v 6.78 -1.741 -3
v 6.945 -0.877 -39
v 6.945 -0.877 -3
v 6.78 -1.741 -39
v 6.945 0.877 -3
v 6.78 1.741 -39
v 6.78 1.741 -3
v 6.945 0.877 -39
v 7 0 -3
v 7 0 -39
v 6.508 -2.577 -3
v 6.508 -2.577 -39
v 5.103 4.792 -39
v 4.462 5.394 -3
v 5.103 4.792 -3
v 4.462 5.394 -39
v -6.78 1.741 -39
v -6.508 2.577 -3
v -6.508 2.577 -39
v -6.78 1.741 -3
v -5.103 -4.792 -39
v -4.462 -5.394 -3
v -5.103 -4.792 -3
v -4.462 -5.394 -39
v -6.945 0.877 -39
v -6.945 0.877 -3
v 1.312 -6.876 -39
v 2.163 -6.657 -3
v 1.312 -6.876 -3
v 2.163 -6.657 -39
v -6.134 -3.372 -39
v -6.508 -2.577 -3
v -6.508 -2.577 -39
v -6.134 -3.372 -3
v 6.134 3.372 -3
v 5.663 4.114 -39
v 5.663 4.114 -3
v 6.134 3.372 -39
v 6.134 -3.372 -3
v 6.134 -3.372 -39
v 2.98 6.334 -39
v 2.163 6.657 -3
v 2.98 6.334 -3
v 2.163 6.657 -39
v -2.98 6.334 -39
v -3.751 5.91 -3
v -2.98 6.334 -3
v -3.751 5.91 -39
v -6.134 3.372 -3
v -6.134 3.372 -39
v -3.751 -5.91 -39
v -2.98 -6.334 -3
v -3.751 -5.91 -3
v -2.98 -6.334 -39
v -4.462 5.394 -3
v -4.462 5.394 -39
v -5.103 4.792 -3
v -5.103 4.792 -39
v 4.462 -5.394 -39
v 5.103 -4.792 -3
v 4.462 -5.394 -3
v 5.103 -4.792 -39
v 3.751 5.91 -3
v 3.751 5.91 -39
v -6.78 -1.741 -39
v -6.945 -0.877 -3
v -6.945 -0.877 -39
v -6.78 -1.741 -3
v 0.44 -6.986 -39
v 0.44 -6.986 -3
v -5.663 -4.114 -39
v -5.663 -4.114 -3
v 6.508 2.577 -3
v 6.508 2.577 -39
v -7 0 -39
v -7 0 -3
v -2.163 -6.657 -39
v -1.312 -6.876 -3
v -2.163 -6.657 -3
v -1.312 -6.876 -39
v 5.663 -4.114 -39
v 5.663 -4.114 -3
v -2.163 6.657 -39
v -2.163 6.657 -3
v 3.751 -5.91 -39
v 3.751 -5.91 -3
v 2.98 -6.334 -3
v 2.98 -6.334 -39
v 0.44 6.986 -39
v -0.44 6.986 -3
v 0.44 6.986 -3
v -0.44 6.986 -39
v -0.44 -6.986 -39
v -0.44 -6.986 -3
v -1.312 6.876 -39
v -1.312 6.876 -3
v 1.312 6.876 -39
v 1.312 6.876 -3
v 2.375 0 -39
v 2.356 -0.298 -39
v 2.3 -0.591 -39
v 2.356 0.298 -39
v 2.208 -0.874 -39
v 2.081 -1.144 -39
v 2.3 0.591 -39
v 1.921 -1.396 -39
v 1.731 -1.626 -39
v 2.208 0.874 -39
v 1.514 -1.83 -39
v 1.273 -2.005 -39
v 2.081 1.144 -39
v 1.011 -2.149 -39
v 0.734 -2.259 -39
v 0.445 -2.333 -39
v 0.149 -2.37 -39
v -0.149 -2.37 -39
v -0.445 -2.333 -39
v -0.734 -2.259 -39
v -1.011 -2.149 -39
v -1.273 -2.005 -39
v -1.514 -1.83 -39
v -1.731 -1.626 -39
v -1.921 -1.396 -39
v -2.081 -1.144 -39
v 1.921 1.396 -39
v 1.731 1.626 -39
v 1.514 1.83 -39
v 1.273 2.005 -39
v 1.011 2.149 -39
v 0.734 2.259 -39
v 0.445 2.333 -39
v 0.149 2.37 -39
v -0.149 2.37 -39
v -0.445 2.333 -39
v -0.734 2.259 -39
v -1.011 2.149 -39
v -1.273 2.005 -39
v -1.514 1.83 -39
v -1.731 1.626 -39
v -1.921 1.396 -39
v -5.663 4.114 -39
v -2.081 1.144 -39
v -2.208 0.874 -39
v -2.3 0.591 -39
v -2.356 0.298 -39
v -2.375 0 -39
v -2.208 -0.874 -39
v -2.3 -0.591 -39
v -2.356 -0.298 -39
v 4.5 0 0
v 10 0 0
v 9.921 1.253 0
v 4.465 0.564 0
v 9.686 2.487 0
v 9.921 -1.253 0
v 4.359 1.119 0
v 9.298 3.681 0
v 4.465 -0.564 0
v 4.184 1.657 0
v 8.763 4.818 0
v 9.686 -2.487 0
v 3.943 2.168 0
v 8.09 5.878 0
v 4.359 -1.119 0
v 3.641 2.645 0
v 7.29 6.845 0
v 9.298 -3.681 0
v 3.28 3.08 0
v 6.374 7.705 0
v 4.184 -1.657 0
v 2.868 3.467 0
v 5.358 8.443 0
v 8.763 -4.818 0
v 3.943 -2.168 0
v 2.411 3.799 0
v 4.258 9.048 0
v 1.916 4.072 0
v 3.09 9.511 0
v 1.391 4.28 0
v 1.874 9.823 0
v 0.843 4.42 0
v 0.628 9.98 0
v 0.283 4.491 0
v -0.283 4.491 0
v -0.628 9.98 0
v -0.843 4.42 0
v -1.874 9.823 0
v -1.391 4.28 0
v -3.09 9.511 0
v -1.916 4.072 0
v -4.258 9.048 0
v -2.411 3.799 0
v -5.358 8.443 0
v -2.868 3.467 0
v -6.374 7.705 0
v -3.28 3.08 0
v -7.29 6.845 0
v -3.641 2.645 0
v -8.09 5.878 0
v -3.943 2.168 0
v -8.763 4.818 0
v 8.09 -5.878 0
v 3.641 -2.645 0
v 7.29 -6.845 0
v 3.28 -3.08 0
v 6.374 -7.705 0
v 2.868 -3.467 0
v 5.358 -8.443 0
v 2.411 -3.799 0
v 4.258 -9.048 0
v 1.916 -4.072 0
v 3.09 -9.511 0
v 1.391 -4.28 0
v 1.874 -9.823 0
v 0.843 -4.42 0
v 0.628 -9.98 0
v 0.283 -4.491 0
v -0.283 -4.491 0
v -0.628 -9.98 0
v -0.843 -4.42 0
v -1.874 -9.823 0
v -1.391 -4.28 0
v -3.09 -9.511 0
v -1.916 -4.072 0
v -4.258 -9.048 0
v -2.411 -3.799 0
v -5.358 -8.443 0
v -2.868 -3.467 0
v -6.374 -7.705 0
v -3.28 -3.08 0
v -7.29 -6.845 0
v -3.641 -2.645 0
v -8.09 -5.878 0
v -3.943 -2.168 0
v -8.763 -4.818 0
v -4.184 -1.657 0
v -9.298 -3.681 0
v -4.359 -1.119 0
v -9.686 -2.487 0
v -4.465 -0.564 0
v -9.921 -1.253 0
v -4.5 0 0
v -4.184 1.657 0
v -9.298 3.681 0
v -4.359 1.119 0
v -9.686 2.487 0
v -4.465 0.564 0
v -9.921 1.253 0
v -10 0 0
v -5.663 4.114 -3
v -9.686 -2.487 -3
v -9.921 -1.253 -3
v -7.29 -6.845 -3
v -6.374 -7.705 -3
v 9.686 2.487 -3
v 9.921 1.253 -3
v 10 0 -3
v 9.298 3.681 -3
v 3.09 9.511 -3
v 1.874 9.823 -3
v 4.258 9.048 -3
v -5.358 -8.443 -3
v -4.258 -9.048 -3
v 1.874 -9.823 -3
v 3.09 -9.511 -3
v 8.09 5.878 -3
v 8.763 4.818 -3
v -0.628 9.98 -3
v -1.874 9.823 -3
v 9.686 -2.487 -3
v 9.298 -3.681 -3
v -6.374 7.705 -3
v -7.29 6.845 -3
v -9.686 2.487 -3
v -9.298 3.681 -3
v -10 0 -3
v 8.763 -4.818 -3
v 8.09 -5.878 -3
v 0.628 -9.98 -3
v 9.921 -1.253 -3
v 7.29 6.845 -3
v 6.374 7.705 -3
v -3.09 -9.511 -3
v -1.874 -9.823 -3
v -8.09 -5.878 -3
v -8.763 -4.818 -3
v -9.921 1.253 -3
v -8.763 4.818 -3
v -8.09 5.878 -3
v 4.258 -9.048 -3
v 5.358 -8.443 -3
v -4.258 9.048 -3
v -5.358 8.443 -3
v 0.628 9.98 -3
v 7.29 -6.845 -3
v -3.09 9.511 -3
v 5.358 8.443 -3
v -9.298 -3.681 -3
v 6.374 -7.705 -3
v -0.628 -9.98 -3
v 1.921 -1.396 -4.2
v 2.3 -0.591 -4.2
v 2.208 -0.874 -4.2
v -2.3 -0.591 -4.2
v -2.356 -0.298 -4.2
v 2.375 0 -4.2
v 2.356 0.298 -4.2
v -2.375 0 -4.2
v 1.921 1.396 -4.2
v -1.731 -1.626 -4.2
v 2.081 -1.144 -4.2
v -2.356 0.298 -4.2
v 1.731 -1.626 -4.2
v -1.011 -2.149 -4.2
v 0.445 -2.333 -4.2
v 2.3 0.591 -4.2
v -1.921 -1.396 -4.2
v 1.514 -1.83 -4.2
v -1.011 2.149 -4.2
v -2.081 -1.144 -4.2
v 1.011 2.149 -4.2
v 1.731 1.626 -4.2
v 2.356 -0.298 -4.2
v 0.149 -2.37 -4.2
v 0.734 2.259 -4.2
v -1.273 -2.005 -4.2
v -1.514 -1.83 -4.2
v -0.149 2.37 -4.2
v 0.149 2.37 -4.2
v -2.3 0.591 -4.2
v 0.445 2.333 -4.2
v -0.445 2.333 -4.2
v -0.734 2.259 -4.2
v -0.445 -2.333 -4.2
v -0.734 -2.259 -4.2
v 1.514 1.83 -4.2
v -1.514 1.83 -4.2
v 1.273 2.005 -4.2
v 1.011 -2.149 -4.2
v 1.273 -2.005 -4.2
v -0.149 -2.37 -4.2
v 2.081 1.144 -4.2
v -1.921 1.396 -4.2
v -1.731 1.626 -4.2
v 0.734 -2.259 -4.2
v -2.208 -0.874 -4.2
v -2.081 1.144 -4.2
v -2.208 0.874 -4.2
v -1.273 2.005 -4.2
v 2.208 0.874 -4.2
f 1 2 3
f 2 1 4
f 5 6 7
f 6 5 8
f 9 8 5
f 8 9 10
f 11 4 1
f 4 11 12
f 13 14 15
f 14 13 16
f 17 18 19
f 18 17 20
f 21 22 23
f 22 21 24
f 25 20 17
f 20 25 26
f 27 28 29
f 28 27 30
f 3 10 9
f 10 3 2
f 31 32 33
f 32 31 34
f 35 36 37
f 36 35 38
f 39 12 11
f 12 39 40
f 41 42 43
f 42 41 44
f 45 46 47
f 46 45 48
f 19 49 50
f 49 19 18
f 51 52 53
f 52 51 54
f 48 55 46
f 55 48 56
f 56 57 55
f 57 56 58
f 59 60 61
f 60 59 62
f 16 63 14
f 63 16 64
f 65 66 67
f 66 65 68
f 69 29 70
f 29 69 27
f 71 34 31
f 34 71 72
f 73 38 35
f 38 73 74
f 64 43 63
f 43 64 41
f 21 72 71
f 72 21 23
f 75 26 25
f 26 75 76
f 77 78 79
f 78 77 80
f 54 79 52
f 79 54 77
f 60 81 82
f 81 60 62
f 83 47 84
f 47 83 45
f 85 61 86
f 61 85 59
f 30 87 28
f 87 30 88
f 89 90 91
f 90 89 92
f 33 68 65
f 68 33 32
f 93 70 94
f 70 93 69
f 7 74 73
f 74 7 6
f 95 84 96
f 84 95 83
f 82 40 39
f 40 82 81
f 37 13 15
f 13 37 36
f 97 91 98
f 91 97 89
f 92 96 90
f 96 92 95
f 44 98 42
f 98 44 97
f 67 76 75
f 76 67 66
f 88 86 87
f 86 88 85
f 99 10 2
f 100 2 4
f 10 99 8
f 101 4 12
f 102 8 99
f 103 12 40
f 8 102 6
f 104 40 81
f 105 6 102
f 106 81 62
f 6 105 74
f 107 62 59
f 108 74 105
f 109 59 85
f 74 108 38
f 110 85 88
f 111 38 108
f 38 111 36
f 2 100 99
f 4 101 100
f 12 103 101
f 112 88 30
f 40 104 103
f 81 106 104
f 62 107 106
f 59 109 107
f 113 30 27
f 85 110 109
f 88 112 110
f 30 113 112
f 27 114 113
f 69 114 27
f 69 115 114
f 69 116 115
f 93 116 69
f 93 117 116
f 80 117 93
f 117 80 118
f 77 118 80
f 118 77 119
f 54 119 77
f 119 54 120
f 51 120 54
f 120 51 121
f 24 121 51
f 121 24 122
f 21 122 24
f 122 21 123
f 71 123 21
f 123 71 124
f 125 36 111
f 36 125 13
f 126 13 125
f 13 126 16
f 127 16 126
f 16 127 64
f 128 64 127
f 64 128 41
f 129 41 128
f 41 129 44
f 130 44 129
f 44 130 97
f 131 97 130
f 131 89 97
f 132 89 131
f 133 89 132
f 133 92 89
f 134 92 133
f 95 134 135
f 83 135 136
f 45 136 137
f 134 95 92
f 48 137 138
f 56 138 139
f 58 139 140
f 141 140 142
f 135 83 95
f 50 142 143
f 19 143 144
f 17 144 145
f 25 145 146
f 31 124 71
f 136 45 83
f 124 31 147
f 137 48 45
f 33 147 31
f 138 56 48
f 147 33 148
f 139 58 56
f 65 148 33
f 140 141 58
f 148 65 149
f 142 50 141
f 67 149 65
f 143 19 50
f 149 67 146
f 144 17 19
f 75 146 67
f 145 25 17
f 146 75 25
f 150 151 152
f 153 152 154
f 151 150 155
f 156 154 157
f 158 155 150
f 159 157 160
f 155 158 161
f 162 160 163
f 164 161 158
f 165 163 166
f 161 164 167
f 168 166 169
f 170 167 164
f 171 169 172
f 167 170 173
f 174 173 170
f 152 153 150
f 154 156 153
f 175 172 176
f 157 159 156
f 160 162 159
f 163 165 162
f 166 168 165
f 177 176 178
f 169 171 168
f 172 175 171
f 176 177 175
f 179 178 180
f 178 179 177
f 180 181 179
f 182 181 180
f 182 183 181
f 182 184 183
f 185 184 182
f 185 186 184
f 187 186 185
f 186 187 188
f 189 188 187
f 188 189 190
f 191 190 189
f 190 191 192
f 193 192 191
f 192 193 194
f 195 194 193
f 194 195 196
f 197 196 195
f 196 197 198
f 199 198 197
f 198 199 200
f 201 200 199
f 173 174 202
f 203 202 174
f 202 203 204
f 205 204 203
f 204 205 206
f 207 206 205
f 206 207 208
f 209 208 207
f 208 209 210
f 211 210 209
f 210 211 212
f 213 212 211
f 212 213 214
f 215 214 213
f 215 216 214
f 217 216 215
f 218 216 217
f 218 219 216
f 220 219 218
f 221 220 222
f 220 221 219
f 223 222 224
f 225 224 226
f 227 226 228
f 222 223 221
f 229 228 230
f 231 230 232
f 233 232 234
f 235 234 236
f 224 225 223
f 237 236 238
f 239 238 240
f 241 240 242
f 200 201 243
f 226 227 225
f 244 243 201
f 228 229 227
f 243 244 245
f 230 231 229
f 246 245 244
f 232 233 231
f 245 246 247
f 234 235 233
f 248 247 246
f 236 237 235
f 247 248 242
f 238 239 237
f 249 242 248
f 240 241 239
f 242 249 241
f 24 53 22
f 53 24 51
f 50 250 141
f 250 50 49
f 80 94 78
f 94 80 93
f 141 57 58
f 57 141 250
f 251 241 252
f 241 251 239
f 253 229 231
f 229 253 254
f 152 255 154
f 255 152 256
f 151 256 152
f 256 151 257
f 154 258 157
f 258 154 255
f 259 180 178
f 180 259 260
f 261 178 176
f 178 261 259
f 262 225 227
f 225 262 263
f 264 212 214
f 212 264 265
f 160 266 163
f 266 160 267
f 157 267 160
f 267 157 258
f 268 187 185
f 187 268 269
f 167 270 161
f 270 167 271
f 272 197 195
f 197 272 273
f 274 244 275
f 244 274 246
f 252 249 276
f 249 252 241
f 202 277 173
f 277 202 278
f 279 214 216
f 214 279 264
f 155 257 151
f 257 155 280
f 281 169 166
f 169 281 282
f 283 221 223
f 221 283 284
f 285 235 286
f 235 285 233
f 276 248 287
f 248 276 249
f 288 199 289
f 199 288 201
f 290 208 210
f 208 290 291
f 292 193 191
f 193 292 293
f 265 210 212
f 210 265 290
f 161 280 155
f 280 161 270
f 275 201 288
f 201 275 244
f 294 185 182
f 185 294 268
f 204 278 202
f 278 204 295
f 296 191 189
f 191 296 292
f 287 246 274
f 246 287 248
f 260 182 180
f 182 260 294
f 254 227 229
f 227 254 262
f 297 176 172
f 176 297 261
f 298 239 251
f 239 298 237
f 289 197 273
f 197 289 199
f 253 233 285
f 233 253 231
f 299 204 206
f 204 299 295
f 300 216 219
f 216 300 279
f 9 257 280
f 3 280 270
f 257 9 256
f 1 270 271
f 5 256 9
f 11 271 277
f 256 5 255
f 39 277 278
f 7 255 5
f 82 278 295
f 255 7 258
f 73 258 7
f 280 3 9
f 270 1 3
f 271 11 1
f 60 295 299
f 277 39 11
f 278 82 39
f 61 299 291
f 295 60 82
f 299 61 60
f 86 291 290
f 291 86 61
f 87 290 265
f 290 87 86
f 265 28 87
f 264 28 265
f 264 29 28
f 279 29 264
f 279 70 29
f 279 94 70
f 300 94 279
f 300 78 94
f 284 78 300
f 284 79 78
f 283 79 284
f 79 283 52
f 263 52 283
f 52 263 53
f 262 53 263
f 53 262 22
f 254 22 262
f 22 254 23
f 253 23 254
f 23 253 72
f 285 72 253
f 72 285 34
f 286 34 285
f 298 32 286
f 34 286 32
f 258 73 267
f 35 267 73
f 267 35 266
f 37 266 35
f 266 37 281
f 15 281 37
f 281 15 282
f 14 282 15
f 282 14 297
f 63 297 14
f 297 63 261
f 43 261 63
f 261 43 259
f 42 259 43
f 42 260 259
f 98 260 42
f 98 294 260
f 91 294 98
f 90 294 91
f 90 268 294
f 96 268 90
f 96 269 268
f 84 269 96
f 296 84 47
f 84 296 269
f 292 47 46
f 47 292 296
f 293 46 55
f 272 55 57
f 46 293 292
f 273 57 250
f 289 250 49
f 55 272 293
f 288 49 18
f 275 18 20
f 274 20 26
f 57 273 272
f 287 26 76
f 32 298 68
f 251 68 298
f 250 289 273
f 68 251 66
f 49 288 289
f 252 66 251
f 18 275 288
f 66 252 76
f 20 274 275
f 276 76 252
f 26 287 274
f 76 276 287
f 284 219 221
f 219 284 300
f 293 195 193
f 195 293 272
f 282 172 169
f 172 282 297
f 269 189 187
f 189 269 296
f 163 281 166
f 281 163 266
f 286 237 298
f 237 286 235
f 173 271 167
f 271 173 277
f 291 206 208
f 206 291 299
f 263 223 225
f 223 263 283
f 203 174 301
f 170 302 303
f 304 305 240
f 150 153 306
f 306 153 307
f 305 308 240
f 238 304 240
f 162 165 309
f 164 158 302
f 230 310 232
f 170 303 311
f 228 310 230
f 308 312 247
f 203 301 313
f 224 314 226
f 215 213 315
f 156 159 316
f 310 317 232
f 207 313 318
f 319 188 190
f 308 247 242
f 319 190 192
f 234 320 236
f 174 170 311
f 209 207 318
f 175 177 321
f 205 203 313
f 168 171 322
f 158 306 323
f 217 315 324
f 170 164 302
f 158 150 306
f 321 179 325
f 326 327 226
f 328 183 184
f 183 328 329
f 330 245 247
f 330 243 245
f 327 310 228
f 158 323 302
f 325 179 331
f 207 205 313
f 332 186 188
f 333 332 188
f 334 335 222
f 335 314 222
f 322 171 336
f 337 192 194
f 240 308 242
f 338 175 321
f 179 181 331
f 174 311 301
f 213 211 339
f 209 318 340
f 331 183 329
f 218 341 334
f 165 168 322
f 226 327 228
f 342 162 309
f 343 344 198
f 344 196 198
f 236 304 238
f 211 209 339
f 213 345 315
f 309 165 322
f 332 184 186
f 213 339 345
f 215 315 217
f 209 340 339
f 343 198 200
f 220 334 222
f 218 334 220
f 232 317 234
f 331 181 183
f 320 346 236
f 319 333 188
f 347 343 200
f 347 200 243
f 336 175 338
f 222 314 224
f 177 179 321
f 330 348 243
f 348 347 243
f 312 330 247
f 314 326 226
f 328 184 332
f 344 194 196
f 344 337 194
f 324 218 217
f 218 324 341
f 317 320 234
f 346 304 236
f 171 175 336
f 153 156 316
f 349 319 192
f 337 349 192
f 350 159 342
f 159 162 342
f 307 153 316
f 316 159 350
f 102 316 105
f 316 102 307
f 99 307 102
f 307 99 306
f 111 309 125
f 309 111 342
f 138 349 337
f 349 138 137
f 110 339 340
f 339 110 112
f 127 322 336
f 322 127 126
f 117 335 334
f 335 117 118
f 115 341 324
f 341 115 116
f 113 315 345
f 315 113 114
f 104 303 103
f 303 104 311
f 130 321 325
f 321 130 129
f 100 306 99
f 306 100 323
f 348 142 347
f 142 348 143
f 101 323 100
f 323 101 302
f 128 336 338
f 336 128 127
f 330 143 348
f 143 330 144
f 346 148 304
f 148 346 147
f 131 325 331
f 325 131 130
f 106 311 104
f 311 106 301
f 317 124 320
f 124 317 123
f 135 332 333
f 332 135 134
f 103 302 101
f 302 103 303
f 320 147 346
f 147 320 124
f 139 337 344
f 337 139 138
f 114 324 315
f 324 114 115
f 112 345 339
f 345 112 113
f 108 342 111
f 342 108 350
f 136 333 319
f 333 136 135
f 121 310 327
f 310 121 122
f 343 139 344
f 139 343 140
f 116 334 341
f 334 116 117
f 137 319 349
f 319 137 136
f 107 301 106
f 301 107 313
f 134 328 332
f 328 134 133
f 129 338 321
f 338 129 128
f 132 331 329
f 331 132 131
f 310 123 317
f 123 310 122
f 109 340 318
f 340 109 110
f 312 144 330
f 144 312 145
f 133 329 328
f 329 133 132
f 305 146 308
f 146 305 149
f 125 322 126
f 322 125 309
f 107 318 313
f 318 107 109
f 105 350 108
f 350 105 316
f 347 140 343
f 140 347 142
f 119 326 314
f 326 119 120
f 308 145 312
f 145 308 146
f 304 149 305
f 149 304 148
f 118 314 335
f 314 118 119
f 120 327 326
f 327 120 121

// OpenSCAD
$fn = 50;


difference() {
	union() {
		translate(v = [0, 0, -39.0000000000]) {
			cylinder(h = 39, r = 7.0000000000);
		}
		translate(v = [0, 0, -3.0000000000]) {
			cylinder(h = 3, r = 10.0000000000);
		}
	}
	union() {
		translate(v = [0, 0, 0]) {
			rotate(a = [0, 0, 0]) {
				difference() {
					union() {
						#translate(v = [0, 0, -39.0000000000]) {
							cylinder(h = 39, r = 2.2500000000);
						}
						#translate(v = [0, 0, -4.2000000000]) {
							cylinder(h = 4.2000000000, r1 = 2.3750000000, r2 = 4.5000000000);
						}
						#translate(v = [0, 0, -39.0000000000]) {
							cylinder(h = 39, r = 2.3750000000);
						}
						#translate(v = [0, 0, -39.0000000000]) {
							cylinder(h = 39, r = 2.2500000000);
						}
					}
					union();
				}
			}
		}
	}
}
